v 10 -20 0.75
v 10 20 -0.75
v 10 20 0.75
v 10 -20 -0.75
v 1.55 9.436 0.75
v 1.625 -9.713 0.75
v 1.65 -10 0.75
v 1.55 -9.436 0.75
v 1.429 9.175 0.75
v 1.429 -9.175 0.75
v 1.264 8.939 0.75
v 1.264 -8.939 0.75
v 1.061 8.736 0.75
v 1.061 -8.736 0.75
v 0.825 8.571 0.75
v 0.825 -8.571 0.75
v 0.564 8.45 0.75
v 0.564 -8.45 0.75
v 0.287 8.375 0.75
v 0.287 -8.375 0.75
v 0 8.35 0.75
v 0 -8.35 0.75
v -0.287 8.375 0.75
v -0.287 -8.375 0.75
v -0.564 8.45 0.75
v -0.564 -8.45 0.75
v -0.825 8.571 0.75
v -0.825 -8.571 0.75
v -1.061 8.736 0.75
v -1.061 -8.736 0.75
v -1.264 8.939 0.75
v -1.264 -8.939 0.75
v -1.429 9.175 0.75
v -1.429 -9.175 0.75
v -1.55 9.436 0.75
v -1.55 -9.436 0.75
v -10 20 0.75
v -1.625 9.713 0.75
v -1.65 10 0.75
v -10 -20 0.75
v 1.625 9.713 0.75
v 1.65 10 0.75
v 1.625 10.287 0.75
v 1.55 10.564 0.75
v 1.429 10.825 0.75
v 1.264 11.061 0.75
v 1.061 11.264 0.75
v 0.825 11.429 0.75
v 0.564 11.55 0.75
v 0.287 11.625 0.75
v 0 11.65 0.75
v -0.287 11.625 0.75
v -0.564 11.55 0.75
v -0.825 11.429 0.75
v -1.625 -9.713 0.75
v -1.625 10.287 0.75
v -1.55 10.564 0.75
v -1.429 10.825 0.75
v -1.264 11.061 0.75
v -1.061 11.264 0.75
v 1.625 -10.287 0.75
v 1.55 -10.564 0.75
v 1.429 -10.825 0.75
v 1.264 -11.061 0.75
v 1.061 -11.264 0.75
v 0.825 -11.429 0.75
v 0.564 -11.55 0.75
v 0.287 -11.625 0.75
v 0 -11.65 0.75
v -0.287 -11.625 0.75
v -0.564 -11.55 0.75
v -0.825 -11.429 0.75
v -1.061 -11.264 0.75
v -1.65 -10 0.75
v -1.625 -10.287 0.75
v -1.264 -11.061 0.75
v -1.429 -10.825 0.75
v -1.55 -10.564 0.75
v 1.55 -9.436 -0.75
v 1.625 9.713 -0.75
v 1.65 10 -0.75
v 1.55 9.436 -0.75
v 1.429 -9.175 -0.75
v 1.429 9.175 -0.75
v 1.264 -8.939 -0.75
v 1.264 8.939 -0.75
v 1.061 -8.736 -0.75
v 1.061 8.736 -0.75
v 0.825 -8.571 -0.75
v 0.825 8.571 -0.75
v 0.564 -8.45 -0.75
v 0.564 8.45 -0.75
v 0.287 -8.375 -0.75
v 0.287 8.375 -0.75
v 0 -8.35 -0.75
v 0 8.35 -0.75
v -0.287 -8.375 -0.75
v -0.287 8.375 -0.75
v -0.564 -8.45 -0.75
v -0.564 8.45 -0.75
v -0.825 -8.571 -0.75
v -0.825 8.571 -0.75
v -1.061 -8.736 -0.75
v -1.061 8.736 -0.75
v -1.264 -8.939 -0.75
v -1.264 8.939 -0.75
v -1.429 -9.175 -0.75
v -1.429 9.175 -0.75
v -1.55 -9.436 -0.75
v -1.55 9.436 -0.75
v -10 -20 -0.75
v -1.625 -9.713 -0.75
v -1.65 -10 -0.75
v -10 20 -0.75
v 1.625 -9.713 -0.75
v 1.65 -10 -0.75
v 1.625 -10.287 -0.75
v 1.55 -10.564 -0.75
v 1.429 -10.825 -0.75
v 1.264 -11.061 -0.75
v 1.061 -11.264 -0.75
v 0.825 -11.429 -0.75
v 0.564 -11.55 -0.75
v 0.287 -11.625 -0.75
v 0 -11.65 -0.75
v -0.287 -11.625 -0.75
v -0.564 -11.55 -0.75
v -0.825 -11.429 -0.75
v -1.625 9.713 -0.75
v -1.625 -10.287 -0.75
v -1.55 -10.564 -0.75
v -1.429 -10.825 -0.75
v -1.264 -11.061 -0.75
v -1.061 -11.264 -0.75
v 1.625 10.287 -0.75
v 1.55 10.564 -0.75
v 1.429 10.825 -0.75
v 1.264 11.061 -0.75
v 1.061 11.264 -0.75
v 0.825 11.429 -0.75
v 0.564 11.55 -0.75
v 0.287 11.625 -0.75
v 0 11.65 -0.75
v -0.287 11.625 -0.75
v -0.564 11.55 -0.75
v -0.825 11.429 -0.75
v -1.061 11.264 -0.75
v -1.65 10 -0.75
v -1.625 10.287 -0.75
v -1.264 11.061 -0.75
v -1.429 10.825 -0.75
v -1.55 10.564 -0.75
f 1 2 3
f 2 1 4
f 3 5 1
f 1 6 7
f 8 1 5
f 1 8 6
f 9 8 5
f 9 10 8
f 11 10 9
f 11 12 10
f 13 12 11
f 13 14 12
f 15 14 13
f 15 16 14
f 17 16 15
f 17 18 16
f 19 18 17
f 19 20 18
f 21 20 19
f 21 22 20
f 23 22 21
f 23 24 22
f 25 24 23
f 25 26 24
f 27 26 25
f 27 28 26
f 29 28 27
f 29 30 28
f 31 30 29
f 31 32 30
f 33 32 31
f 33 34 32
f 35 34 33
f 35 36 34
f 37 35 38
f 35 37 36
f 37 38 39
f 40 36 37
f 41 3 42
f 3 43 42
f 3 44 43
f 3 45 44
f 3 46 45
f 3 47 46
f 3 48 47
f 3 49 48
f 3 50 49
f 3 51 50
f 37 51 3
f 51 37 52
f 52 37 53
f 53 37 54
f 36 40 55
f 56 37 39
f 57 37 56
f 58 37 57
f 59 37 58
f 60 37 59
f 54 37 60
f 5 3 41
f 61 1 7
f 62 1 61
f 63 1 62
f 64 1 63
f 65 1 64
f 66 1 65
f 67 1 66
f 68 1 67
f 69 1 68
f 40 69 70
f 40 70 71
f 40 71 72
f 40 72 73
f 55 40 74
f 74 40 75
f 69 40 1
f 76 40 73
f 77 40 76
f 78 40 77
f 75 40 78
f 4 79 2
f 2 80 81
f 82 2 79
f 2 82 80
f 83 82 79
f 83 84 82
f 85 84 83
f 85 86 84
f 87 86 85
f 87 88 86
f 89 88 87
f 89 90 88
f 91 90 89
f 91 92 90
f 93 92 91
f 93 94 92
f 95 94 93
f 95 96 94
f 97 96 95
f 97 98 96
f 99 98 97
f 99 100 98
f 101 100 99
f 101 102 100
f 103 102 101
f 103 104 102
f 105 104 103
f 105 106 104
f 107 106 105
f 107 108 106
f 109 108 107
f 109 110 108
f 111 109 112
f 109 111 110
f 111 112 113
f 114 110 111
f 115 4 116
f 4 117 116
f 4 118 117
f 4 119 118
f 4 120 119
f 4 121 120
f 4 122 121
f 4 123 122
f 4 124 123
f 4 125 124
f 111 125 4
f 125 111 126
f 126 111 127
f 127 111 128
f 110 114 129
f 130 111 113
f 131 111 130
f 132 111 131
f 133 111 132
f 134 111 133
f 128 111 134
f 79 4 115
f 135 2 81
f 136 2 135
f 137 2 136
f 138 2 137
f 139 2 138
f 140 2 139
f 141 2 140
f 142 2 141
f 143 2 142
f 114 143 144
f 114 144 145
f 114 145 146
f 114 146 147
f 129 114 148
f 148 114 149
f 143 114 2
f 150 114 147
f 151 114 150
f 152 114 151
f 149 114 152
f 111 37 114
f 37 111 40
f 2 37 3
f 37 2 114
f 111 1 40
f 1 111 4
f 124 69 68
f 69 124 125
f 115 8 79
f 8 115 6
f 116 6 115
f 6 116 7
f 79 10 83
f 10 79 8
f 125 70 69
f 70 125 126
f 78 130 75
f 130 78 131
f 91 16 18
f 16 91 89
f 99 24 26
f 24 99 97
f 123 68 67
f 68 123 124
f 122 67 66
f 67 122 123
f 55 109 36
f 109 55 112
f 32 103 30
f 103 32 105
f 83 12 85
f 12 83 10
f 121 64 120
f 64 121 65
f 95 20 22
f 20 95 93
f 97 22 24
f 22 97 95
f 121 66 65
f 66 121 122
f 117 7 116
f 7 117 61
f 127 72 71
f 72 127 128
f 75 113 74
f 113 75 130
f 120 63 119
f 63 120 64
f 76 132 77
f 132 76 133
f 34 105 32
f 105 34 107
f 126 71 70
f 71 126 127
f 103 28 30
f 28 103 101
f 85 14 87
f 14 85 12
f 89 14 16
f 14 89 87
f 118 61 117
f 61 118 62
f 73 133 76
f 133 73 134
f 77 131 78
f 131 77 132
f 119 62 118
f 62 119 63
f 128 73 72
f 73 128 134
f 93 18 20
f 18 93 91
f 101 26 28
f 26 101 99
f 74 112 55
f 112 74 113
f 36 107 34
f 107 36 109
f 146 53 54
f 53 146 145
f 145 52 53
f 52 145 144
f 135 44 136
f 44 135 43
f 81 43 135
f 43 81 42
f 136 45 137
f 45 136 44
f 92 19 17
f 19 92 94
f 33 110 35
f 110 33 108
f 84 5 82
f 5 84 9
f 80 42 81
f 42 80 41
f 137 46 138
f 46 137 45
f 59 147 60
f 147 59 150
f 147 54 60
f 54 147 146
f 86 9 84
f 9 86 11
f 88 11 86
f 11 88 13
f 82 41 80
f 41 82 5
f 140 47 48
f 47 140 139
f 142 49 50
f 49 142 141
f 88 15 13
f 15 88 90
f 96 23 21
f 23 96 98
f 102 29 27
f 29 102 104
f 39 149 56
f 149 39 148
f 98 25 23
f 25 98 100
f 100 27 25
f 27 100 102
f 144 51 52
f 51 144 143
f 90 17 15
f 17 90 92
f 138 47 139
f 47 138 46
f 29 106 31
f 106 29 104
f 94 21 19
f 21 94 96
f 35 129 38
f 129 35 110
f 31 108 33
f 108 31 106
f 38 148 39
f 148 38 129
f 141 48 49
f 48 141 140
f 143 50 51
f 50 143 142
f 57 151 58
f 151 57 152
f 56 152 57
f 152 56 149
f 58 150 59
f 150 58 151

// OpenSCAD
//
//  First version of magnet mount plate -- just a test
//
//  space two countersunk magnets 20mm apart on a little
//  plastic plate to mount on a 20mm extrusion.
//  VERY MUCH A WORK IN PROGRESS!
//

//
//  Copyright (c) 2020 Sarah Kelley, sarah@sakelley.org
//
//  Permission is hereby granted, free of charge, to any person obtaining a copy
//  of this software and associated documentation files (the "Software"), to deal
//  in the Software without restriction, including without limitation the rights
//  to use, copy, modify, merge, publish, distribute, sublicense, and/or sell
//  copies of the Software, and to permit persons to whom the Software is
//  furnished to do so, subject to the following conditions:
//  
//  The above copyright notice and this permission notice shall be included in all
//  copies or substantial portions of the Software.
//  
//  THE SOFTWARE IS PROVIDED "AS IS", WITHOUT WARRANTY OF ANY KIND, EXPRESS OR
//  IMPLIED, INCLUDING BUT NOT LIMITED TO THE WARRANTIES OF MERCHANTABILITY,
//  FITNESS FOR A PARTICULAR PURPOSE AND NONINFRINGEMENT. IN NO EVENT SHALL THE
//  AUTHORS OR COPYRIGHT HOLDERS BE LIABLE FOR ANY CLAIM, DAMAGES OR OTHER
//  LIABILITY, WHETHER IN AN ACTION OF CONTRACT, TORT OR OTHERWISE, ARISING FROM,
//  OUT OF OR IN CONNECTION WITH THE SOFTWARE OR THE USE OR OTHER DEALINGS IN THE
//  SOFTWARE.
//


holeSize = 3.3;
width = 20;
length = 40;
thickness = 1.5;


difference() {
    cube([width,length,thickness], center=true);
    translate([0,(-length/2)+(width/2),0]) 
        cylinder(h = 1000, d=holeSize, center=true, $fn=36);
    translate([0,(length/2)-(width/2),0]) 
        cylinder(h = 1000, d=holeSize, center=true, $fn=36);
}
